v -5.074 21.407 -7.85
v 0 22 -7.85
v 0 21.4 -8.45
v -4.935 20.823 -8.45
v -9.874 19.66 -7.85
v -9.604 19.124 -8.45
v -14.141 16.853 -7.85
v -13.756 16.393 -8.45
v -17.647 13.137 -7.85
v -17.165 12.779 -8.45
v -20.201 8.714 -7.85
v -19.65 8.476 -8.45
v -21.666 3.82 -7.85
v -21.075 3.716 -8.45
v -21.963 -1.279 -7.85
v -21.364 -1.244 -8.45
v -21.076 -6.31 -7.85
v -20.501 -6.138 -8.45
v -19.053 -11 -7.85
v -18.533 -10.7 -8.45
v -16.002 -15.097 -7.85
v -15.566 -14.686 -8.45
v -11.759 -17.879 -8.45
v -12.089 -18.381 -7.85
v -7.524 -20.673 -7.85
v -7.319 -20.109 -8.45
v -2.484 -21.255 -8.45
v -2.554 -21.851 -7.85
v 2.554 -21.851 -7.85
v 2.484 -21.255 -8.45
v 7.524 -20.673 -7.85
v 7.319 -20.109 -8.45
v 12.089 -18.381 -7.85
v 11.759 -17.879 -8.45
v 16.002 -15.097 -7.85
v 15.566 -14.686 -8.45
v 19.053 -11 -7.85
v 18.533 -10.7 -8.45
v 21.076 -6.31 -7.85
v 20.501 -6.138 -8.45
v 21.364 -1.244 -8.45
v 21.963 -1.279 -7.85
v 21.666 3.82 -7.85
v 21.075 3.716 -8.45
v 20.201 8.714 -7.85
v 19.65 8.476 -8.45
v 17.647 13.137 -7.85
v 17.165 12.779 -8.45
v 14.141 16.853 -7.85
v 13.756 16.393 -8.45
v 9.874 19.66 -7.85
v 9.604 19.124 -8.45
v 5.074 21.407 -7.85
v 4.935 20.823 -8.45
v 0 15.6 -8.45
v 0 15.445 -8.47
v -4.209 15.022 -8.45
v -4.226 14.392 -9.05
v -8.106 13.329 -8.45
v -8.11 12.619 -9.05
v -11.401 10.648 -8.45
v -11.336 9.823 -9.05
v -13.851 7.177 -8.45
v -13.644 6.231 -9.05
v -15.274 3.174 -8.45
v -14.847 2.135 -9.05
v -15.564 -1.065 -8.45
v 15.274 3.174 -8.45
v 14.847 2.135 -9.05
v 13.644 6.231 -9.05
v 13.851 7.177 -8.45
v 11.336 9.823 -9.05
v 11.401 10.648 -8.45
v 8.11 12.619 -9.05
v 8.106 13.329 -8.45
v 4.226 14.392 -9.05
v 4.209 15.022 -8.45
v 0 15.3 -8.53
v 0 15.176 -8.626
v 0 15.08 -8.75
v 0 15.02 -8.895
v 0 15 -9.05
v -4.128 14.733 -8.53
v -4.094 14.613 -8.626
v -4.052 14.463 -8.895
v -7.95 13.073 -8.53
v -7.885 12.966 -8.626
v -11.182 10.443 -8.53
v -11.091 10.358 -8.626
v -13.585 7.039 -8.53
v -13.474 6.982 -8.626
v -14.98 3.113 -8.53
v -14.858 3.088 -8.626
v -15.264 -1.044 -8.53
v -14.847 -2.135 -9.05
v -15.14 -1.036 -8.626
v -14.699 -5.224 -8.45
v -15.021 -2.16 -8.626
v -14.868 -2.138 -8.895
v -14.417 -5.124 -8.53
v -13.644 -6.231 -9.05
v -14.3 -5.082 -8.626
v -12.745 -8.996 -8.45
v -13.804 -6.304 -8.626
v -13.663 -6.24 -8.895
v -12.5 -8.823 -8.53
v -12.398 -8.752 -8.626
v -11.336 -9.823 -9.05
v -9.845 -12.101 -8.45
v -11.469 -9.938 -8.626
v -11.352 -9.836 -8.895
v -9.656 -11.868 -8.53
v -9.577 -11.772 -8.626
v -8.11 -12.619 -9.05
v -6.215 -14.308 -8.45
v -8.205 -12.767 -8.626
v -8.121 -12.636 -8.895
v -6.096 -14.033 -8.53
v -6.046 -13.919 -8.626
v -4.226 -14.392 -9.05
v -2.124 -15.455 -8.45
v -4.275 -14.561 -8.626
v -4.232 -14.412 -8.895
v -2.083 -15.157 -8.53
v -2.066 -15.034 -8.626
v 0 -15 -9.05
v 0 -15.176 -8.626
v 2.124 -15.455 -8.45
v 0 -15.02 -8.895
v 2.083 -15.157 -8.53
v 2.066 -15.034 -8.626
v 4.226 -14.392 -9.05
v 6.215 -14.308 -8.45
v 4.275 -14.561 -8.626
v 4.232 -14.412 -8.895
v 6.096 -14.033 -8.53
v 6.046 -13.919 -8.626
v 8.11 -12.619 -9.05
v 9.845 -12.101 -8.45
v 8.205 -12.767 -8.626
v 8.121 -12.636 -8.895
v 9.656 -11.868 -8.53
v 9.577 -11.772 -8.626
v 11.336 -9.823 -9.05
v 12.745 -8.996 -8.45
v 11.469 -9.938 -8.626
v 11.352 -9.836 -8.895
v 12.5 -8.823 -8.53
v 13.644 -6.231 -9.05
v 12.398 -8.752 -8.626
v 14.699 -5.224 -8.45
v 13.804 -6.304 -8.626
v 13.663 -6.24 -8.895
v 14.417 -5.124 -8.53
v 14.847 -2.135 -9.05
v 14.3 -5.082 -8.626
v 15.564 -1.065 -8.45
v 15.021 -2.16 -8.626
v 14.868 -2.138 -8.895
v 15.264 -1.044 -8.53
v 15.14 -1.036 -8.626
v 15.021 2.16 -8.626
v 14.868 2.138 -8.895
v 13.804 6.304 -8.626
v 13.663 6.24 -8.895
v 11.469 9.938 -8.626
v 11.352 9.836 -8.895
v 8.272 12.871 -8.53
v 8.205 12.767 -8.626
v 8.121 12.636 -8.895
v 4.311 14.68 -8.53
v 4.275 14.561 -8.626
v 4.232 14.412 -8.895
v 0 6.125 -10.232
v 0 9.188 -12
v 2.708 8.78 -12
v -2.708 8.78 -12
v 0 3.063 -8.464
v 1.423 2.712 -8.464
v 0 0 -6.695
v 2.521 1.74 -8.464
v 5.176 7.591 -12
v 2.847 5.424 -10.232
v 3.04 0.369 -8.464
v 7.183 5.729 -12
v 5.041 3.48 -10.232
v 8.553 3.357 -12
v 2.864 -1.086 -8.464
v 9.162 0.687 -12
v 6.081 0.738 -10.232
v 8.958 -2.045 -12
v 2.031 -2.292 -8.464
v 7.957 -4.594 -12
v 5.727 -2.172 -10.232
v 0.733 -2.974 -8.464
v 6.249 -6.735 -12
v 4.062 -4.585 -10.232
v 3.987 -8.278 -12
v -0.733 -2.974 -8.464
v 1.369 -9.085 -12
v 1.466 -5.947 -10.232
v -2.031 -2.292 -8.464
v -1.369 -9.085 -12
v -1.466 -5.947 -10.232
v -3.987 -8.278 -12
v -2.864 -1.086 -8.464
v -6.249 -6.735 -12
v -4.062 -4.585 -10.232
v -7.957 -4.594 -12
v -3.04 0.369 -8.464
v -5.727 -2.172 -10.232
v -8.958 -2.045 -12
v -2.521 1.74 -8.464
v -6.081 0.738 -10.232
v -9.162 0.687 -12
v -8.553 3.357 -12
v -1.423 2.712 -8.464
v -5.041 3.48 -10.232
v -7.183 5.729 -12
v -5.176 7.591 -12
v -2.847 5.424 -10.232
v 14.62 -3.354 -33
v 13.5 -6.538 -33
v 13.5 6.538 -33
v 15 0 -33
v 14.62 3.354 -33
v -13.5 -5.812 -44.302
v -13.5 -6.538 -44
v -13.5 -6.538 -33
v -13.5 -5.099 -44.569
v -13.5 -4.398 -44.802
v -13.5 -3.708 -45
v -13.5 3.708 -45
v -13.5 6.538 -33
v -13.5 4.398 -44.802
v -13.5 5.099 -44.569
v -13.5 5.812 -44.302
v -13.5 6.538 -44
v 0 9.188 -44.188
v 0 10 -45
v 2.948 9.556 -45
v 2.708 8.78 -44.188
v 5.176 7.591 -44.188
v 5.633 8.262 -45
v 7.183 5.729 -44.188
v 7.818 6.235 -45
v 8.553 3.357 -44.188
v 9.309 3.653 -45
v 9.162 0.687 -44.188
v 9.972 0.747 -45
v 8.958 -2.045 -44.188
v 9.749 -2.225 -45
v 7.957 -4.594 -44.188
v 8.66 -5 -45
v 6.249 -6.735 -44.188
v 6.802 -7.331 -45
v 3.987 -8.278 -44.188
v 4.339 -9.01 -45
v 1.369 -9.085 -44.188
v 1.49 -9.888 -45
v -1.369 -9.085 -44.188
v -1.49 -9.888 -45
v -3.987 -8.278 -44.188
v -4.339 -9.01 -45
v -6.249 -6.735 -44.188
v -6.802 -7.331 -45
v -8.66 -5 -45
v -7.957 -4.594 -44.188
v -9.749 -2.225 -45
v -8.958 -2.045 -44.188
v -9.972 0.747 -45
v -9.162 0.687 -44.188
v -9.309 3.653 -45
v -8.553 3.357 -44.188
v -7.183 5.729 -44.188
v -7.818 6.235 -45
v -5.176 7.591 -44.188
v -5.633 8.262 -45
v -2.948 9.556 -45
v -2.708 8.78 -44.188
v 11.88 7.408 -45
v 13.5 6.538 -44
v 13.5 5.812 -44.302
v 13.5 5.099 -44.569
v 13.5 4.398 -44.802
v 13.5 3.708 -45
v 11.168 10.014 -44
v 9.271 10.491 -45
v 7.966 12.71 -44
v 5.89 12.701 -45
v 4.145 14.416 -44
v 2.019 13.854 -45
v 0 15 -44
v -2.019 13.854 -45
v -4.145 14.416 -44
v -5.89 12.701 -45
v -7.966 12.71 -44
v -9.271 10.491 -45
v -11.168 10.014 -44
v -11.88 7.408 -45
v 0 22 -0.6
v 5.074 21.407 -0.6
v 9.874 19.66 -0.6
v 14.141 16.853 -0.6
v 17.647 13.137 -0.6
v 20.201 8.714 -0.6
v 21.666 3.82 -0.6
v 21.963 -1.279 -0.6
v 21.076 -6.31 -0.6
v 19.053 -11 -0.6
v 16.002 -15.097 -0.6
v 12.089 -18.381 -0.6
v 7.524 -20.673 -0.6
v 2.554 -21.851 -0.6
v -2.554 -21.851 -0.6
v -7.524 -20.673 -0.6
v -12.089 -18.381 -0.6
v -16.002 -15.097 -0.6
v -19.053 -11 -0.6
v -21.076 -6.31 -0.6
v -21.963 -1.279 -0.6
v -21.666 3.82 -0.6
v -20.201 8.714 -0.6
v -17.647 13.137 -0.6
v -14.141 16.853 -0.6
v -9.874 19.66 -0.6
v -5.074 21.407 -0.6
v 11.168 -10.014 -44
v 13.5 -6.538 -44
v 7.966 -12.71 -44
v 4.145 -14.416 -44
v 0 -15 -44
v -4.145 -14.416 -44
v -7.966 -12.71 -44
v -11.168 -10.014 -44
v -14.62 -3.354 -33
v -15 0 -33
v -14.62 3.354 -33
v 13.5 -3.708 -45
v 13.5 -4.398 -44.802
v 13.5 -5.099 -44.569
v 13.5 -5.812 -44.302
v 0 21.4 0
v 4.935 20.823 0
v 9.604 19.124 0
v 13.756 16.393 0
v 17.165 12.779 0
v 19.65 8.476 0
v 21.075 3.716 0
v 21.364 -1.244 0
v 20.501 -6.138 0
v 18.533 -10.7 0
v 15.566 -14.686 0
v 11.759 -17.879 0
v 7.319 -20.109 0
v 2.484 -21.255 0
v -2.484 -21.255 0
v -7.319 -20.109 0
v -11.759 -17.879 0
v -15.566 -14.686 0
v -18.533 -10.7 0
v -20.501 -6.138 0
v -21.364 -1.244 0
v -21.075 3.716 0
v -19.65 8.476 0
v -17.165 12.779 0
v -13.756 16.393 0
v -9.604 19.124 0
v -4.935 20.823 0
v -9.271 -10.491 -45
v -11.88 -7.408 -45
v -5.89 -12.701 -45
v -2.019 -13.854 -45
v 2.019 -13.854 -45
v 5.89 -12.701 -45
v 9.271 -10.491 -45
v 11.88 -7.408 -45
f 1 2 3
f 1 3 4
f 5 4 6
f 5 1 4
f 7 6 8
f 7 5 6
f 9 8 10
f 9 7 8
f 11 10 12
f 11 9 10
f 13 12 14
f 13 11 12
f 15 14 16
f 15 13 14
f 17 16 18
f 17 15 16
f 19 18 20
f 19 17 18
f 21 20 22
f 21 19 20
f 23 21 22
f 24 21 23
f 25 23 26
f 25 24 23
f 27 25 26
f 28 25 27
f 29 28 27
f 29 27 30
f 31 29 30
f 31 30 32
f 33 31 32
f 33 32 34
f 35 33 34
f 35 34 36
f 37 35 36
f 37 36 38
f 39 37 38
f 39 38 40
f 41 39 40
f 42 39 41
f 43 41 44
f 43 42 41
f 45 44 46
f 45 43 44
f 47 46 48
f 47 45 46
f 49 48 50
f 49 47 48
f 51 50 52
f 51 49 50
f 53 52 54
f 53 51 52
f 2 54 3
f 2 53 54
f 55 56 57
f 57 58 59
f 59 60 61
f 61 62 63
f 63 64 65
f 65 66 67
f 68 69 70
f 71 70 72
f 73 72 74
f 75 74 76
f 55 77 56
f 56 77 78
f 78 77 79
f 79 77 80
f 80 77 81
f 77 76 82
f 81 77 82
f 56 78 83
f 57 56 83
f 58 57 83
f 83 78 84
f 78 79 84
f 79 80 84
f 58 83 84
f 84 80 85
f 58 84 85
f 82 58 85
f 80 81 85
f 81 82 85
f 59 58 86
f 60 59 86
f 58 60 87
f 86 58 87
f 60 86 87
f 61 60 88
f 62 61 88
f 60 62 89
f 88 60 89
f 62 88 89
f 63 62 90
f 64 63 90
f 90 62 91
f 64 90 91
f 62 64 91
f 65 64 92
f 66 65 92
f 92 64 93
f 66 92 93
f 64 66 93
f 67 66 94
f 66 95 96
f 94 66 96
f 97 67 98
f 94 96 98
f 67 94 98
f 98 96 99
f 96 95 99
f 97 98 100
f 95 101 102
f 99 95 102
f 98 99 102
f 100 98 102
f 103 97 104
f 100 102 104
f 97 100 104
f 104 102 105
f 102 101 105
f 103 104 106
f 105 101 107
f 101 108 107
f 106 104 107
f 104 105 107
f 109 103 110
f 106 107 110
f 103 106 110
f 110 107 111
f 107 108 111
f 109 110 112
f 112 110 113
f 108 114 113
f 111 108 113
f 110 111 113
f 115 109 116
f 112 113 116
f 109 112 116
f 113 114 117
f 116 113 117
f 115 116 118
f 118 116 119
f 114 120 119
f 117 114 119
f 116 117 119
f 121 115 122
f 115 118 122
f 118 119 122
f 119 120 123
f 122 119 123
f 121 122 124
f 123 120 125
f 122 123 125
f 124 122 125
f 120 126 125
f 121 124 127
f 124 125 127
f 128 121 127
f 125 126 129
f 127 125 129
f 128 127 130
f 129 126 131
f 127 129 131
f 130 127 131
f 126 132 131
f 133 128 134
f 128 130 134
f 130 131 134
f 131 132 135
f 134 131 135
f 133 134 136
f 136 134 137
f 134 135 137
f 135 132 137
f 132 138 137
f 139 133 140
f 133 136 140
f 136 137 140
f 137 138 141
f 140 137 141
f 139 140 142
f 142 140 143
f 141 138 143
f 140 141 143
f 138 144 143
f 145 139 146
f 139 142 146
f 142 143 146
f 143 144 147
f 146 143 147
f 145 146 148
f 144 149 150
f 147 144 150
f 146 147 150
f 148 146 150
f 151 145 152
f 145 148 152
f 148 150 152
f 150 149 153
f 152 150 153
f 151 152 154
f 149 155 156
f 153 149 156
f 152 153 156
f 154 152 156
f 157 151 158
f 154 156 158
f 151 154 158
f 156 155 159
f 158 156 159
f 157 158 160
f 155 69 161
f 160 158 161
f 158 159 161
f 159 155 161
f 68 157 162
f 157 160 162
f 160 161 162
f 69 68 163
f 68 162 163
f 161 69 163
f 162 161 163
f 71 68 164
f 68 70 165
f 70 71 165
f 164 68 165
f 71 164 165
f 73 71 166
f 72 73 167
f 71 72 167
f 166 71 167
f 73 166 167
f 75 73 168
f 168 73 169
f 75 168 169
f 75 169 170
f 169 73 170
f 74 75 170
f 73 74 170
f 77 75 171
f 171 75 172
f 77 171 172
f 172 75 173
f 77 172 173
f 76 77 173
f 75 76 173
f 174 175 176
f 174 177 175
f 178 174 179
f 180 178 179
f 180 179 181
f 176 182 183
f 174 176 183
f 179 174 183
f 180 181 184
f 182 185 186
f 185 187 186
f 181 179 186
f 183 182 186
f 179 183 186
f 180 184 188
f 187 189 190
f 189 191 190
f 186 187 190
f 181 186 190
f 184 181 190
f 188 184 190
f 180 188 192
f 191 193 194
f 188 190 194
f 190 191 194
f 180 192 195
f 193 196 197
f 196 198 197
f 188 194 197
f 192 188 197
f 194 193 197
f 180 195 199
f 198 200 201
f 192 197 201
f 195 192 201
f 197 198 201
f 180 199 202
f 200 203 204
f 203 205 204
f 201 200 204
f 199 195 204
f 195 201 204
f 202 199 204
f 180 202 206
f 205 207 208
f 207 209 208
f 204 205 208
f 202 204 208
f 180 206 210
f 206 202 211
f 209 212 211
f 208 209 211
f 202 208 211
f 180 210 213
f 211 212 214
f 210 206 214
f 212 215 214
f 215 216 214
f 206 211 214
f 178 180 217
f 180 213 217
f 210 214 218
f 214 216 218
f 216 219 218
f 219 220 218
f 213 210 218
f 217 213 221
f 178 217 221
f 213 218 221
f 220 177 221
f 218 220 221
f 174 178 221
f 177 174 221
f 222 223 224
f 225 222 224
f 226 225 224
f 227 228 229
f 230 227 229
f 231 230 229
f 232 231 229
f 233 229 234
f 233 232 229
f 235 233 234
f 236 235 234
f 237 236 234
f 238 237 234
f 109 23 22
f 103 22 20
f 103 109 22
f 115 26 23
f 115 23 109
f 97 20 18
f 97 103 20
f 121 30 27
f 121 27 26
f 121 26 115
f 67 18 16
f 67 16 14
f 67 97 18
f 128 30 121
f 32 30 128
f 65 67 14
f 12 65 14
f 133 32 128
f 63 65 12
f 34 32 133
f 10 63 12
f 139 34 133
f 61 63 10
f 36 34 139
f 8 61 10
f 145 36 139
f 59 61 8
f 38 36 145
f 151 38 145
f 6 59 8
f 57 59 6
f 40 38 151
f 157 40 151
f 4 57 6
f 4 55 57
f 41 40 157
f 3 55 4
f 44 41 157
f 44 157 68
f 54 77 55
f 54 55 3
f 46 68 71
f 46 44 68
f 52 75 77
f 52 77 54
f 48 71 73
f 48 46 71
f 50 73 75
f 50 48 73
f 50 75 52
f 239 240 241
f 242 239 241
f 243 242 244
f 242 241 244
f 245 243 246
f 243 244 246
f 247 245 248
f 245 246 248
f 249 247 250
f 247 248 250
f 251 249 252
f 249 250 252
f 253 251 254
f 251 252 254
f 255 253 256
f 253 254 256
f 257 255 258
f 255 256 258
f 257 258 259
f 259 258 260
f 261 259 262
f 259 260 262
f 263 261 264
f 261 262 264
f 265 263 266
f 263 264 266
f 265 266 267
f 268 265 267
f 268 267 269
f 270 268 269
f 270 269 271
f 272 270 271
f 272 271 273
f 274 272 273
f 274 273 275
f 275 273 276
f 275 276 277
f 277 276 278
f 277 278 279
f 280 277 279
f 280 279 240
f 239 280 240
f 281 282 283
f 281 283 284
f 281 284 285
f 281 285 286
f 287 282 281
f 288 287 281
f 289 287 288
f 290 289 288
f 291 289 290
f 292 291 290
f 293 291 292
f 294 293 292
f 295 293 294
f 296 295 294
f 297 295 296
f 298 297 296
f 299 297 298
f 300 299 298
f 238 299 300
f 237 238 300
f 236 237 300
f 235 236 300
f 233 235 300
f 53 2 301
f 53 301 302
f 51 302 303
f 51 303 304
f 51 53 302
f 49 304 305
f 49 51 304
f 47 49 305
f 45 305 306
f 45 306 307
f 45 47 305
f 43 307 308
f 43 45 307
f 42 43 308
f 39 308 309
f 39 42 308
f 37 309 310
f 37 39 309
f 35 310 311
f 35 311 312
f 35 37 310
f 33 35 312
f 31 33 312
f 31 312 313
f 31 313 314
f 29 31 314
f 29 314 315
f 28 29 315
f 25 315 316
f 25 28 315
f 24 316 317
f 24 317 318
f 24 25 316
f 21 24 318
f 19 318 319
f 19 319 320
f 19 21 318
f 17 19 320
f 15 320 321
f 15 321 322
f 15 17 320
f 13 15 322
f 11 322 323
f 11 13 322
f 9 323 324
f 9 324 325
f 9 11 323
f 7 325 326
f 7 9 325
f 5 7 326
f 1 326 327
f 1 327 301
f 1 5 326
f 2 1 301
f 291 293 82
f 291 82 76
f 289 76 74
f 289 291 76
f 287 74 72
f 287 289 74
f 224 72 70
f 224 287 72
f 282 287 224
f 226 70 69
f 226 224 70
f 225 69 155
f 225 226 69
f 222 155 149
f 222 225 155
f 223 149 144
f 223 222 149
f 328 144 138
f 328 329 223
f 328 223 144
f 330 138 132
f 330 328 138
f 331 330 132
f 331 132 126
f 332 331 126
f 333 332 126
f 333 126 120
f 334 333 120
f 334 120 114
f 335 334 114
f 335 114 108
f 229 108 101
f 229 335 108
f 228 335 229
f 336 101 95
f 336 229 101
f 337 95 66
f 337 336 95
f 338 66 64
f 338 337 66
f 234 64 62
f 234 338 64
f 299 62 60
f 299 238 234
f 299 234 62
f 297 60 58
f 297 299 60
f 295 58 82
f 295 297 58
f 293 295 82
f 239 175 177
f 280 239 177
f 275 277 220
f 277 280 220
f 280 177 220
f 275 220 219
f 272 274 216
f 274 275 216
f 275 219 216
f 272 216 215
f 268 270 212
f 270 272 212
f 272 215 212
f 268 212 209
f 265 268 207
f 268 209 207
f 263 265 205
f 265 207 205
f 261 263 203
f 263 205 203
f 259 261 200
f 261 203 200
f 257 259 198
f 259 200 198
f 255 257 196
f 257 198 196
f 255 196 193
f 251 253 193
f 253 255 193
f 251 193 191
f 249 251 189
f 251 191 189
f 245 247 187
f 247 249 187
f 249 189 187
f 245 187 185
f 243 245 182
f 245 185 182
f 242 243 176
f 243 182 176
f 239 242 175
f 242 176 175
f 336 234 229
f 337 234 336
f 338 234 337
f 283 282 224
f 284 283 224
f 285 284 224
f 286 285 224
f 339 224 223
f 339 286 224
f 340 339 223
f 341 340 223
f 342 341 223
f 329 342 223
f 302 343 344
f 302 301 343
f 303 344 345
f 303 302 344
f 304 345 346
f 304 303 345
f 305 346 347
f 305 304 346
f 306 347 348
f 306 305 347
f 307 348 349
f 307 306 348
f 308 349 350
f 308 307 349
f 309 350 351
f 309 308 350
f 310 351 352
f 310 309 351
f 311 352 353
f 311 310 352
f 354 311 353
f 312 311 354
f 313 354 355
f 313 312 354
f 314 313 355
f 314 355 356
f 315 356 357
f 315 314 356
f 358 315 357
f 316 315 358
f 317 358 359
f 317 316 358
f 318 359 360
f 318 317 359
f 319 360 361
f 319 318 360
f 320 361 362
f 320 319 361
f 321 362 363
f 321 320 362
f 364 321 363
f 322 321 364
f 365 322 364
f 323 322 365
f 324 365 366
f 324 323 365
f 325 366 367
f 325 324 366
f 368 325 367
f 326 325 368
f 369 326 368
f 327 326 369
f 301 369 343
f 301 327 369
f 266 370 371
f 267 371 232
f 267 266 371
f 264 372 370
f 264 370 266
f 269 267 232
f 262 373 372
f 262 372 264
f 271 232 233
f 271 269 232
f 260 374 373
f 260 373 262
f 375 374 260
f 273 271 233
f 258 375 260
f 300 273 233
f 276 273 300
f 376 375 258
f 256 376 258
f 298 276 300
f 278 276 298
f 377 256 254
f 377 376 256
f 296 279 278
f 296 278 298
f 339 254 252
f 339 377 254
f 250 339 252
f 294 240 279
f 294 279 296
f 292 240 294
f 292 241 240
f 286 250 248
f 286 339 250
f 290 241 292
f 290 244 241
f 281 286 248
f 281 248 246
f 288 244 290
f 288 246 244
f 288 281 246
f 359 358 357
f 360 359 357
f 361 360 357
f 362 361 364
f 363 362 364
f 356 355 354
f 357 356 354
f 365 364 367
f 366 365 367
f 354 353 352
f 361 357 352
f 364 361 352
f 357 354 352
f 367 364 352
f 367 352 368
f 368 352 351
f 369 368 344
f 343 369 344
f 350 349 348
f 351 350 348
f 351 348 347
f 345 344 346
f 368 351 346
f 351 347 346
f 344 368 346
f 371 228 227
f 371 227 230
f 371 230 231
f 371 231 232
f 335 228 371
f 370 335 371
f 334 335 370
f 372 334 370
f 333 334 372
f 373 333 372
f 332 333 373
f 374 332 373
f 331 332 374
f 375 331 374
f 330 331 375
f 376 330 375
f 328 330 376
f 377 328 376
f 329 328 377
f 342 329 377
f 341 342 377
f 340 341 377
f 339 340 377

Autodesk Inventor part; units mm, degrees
sketch "Sketch_1" plane through (0, 0, 0) normal (1, 0, 0) x (0, 1, 0)
  line L0 (0, -6.6953) -> (0, 0)
  line L1 (0, 0) -> (21.4, 0)
  line L2 (21.4, 0) -> (22, -0.6)
  line L3 (22, -0.6) -> (22, -7.85)
  line L4 (22, -7.85) -> (21.4, -8.45)
  line L5 (21.4, -8.45) -> (15.6, -8.45)
  arc A0 (15.6, -8.45) -> (15, -9.05) centre (15.6, -9.05) ccw
  line L6 (15, -9.05) -> (15, -44)
  line L7 (15, -44) -> (14, -45)
  line L8 (14, -45) -> (10, -45)
  line L9 (10, -45) -> (9.188, -44.188)
  line L10 (9.188, -44.188) -> (9.188, -12)
  line L11 (9.188, -12) -> (0, -6.6953)
  line L12 (0, -6.6953) -> (0, 0)
revolve "Revolution1" add sketch "Sketch_1" angle 360 about axis through (0, 0, -6.6953) along (0, 0, -1)
thread "Thread1" size "M20x1.5" class "6H" standard "ISO Metric profile" length 29.188
sketch "Sketch_4" plane through (0, 0, -45) normal (0, 0, 1) x (1, 0, 0)
  line L0 (-18.5, -27) -> (18.5, -27)
  line L1 (18.5, -27) -> (18.5, 22)
  line L2 (18.5, 22) -> (13.5, 22)
  line L3 (13.5, 22) -> (13.5, -22)
  line L4 (13.5, -22) -> (-13.5, -22)
  line L5 (-13.5, -22) -> (-13.5, 22)
  line L6 (-13.5, 22) -> (-18.5, 22)
  line L7 (-18.5, 22) -> (-18.5, -27)
extrude "Extrusion1" cut sketch "Sketch_4" along normal blind 12
ref_plane "ANBAU_XY" through (0, 0, -8.45) normal (0, 0, 1) x (1, 0, 0)
ref_plane "ANBAU_YZ" through (0, 0, -8.45) normal (1, 0, 0) x (0, 1, 0)
ref_plane "ANBAU_ZX" through (0, 0, -8.45) normal (0, 1, 0) x (0, 0, 1)
ref_plane "EP_IP_XY" through (0, 0, 0) normal (0, 0, -1) x (1, 0, 0)
ref_plane "EP_IP_YZ" through (0, 0, 0) normal (1, 0, 0) x (0, -1, 0)
ref_plane "EP_IP_ZX" through (0, 0, 0) normal (0, -1, 0) x (0, 0, -1)
properties part number "1559400 EAGF-V2-KF-80/100---(GS)"
